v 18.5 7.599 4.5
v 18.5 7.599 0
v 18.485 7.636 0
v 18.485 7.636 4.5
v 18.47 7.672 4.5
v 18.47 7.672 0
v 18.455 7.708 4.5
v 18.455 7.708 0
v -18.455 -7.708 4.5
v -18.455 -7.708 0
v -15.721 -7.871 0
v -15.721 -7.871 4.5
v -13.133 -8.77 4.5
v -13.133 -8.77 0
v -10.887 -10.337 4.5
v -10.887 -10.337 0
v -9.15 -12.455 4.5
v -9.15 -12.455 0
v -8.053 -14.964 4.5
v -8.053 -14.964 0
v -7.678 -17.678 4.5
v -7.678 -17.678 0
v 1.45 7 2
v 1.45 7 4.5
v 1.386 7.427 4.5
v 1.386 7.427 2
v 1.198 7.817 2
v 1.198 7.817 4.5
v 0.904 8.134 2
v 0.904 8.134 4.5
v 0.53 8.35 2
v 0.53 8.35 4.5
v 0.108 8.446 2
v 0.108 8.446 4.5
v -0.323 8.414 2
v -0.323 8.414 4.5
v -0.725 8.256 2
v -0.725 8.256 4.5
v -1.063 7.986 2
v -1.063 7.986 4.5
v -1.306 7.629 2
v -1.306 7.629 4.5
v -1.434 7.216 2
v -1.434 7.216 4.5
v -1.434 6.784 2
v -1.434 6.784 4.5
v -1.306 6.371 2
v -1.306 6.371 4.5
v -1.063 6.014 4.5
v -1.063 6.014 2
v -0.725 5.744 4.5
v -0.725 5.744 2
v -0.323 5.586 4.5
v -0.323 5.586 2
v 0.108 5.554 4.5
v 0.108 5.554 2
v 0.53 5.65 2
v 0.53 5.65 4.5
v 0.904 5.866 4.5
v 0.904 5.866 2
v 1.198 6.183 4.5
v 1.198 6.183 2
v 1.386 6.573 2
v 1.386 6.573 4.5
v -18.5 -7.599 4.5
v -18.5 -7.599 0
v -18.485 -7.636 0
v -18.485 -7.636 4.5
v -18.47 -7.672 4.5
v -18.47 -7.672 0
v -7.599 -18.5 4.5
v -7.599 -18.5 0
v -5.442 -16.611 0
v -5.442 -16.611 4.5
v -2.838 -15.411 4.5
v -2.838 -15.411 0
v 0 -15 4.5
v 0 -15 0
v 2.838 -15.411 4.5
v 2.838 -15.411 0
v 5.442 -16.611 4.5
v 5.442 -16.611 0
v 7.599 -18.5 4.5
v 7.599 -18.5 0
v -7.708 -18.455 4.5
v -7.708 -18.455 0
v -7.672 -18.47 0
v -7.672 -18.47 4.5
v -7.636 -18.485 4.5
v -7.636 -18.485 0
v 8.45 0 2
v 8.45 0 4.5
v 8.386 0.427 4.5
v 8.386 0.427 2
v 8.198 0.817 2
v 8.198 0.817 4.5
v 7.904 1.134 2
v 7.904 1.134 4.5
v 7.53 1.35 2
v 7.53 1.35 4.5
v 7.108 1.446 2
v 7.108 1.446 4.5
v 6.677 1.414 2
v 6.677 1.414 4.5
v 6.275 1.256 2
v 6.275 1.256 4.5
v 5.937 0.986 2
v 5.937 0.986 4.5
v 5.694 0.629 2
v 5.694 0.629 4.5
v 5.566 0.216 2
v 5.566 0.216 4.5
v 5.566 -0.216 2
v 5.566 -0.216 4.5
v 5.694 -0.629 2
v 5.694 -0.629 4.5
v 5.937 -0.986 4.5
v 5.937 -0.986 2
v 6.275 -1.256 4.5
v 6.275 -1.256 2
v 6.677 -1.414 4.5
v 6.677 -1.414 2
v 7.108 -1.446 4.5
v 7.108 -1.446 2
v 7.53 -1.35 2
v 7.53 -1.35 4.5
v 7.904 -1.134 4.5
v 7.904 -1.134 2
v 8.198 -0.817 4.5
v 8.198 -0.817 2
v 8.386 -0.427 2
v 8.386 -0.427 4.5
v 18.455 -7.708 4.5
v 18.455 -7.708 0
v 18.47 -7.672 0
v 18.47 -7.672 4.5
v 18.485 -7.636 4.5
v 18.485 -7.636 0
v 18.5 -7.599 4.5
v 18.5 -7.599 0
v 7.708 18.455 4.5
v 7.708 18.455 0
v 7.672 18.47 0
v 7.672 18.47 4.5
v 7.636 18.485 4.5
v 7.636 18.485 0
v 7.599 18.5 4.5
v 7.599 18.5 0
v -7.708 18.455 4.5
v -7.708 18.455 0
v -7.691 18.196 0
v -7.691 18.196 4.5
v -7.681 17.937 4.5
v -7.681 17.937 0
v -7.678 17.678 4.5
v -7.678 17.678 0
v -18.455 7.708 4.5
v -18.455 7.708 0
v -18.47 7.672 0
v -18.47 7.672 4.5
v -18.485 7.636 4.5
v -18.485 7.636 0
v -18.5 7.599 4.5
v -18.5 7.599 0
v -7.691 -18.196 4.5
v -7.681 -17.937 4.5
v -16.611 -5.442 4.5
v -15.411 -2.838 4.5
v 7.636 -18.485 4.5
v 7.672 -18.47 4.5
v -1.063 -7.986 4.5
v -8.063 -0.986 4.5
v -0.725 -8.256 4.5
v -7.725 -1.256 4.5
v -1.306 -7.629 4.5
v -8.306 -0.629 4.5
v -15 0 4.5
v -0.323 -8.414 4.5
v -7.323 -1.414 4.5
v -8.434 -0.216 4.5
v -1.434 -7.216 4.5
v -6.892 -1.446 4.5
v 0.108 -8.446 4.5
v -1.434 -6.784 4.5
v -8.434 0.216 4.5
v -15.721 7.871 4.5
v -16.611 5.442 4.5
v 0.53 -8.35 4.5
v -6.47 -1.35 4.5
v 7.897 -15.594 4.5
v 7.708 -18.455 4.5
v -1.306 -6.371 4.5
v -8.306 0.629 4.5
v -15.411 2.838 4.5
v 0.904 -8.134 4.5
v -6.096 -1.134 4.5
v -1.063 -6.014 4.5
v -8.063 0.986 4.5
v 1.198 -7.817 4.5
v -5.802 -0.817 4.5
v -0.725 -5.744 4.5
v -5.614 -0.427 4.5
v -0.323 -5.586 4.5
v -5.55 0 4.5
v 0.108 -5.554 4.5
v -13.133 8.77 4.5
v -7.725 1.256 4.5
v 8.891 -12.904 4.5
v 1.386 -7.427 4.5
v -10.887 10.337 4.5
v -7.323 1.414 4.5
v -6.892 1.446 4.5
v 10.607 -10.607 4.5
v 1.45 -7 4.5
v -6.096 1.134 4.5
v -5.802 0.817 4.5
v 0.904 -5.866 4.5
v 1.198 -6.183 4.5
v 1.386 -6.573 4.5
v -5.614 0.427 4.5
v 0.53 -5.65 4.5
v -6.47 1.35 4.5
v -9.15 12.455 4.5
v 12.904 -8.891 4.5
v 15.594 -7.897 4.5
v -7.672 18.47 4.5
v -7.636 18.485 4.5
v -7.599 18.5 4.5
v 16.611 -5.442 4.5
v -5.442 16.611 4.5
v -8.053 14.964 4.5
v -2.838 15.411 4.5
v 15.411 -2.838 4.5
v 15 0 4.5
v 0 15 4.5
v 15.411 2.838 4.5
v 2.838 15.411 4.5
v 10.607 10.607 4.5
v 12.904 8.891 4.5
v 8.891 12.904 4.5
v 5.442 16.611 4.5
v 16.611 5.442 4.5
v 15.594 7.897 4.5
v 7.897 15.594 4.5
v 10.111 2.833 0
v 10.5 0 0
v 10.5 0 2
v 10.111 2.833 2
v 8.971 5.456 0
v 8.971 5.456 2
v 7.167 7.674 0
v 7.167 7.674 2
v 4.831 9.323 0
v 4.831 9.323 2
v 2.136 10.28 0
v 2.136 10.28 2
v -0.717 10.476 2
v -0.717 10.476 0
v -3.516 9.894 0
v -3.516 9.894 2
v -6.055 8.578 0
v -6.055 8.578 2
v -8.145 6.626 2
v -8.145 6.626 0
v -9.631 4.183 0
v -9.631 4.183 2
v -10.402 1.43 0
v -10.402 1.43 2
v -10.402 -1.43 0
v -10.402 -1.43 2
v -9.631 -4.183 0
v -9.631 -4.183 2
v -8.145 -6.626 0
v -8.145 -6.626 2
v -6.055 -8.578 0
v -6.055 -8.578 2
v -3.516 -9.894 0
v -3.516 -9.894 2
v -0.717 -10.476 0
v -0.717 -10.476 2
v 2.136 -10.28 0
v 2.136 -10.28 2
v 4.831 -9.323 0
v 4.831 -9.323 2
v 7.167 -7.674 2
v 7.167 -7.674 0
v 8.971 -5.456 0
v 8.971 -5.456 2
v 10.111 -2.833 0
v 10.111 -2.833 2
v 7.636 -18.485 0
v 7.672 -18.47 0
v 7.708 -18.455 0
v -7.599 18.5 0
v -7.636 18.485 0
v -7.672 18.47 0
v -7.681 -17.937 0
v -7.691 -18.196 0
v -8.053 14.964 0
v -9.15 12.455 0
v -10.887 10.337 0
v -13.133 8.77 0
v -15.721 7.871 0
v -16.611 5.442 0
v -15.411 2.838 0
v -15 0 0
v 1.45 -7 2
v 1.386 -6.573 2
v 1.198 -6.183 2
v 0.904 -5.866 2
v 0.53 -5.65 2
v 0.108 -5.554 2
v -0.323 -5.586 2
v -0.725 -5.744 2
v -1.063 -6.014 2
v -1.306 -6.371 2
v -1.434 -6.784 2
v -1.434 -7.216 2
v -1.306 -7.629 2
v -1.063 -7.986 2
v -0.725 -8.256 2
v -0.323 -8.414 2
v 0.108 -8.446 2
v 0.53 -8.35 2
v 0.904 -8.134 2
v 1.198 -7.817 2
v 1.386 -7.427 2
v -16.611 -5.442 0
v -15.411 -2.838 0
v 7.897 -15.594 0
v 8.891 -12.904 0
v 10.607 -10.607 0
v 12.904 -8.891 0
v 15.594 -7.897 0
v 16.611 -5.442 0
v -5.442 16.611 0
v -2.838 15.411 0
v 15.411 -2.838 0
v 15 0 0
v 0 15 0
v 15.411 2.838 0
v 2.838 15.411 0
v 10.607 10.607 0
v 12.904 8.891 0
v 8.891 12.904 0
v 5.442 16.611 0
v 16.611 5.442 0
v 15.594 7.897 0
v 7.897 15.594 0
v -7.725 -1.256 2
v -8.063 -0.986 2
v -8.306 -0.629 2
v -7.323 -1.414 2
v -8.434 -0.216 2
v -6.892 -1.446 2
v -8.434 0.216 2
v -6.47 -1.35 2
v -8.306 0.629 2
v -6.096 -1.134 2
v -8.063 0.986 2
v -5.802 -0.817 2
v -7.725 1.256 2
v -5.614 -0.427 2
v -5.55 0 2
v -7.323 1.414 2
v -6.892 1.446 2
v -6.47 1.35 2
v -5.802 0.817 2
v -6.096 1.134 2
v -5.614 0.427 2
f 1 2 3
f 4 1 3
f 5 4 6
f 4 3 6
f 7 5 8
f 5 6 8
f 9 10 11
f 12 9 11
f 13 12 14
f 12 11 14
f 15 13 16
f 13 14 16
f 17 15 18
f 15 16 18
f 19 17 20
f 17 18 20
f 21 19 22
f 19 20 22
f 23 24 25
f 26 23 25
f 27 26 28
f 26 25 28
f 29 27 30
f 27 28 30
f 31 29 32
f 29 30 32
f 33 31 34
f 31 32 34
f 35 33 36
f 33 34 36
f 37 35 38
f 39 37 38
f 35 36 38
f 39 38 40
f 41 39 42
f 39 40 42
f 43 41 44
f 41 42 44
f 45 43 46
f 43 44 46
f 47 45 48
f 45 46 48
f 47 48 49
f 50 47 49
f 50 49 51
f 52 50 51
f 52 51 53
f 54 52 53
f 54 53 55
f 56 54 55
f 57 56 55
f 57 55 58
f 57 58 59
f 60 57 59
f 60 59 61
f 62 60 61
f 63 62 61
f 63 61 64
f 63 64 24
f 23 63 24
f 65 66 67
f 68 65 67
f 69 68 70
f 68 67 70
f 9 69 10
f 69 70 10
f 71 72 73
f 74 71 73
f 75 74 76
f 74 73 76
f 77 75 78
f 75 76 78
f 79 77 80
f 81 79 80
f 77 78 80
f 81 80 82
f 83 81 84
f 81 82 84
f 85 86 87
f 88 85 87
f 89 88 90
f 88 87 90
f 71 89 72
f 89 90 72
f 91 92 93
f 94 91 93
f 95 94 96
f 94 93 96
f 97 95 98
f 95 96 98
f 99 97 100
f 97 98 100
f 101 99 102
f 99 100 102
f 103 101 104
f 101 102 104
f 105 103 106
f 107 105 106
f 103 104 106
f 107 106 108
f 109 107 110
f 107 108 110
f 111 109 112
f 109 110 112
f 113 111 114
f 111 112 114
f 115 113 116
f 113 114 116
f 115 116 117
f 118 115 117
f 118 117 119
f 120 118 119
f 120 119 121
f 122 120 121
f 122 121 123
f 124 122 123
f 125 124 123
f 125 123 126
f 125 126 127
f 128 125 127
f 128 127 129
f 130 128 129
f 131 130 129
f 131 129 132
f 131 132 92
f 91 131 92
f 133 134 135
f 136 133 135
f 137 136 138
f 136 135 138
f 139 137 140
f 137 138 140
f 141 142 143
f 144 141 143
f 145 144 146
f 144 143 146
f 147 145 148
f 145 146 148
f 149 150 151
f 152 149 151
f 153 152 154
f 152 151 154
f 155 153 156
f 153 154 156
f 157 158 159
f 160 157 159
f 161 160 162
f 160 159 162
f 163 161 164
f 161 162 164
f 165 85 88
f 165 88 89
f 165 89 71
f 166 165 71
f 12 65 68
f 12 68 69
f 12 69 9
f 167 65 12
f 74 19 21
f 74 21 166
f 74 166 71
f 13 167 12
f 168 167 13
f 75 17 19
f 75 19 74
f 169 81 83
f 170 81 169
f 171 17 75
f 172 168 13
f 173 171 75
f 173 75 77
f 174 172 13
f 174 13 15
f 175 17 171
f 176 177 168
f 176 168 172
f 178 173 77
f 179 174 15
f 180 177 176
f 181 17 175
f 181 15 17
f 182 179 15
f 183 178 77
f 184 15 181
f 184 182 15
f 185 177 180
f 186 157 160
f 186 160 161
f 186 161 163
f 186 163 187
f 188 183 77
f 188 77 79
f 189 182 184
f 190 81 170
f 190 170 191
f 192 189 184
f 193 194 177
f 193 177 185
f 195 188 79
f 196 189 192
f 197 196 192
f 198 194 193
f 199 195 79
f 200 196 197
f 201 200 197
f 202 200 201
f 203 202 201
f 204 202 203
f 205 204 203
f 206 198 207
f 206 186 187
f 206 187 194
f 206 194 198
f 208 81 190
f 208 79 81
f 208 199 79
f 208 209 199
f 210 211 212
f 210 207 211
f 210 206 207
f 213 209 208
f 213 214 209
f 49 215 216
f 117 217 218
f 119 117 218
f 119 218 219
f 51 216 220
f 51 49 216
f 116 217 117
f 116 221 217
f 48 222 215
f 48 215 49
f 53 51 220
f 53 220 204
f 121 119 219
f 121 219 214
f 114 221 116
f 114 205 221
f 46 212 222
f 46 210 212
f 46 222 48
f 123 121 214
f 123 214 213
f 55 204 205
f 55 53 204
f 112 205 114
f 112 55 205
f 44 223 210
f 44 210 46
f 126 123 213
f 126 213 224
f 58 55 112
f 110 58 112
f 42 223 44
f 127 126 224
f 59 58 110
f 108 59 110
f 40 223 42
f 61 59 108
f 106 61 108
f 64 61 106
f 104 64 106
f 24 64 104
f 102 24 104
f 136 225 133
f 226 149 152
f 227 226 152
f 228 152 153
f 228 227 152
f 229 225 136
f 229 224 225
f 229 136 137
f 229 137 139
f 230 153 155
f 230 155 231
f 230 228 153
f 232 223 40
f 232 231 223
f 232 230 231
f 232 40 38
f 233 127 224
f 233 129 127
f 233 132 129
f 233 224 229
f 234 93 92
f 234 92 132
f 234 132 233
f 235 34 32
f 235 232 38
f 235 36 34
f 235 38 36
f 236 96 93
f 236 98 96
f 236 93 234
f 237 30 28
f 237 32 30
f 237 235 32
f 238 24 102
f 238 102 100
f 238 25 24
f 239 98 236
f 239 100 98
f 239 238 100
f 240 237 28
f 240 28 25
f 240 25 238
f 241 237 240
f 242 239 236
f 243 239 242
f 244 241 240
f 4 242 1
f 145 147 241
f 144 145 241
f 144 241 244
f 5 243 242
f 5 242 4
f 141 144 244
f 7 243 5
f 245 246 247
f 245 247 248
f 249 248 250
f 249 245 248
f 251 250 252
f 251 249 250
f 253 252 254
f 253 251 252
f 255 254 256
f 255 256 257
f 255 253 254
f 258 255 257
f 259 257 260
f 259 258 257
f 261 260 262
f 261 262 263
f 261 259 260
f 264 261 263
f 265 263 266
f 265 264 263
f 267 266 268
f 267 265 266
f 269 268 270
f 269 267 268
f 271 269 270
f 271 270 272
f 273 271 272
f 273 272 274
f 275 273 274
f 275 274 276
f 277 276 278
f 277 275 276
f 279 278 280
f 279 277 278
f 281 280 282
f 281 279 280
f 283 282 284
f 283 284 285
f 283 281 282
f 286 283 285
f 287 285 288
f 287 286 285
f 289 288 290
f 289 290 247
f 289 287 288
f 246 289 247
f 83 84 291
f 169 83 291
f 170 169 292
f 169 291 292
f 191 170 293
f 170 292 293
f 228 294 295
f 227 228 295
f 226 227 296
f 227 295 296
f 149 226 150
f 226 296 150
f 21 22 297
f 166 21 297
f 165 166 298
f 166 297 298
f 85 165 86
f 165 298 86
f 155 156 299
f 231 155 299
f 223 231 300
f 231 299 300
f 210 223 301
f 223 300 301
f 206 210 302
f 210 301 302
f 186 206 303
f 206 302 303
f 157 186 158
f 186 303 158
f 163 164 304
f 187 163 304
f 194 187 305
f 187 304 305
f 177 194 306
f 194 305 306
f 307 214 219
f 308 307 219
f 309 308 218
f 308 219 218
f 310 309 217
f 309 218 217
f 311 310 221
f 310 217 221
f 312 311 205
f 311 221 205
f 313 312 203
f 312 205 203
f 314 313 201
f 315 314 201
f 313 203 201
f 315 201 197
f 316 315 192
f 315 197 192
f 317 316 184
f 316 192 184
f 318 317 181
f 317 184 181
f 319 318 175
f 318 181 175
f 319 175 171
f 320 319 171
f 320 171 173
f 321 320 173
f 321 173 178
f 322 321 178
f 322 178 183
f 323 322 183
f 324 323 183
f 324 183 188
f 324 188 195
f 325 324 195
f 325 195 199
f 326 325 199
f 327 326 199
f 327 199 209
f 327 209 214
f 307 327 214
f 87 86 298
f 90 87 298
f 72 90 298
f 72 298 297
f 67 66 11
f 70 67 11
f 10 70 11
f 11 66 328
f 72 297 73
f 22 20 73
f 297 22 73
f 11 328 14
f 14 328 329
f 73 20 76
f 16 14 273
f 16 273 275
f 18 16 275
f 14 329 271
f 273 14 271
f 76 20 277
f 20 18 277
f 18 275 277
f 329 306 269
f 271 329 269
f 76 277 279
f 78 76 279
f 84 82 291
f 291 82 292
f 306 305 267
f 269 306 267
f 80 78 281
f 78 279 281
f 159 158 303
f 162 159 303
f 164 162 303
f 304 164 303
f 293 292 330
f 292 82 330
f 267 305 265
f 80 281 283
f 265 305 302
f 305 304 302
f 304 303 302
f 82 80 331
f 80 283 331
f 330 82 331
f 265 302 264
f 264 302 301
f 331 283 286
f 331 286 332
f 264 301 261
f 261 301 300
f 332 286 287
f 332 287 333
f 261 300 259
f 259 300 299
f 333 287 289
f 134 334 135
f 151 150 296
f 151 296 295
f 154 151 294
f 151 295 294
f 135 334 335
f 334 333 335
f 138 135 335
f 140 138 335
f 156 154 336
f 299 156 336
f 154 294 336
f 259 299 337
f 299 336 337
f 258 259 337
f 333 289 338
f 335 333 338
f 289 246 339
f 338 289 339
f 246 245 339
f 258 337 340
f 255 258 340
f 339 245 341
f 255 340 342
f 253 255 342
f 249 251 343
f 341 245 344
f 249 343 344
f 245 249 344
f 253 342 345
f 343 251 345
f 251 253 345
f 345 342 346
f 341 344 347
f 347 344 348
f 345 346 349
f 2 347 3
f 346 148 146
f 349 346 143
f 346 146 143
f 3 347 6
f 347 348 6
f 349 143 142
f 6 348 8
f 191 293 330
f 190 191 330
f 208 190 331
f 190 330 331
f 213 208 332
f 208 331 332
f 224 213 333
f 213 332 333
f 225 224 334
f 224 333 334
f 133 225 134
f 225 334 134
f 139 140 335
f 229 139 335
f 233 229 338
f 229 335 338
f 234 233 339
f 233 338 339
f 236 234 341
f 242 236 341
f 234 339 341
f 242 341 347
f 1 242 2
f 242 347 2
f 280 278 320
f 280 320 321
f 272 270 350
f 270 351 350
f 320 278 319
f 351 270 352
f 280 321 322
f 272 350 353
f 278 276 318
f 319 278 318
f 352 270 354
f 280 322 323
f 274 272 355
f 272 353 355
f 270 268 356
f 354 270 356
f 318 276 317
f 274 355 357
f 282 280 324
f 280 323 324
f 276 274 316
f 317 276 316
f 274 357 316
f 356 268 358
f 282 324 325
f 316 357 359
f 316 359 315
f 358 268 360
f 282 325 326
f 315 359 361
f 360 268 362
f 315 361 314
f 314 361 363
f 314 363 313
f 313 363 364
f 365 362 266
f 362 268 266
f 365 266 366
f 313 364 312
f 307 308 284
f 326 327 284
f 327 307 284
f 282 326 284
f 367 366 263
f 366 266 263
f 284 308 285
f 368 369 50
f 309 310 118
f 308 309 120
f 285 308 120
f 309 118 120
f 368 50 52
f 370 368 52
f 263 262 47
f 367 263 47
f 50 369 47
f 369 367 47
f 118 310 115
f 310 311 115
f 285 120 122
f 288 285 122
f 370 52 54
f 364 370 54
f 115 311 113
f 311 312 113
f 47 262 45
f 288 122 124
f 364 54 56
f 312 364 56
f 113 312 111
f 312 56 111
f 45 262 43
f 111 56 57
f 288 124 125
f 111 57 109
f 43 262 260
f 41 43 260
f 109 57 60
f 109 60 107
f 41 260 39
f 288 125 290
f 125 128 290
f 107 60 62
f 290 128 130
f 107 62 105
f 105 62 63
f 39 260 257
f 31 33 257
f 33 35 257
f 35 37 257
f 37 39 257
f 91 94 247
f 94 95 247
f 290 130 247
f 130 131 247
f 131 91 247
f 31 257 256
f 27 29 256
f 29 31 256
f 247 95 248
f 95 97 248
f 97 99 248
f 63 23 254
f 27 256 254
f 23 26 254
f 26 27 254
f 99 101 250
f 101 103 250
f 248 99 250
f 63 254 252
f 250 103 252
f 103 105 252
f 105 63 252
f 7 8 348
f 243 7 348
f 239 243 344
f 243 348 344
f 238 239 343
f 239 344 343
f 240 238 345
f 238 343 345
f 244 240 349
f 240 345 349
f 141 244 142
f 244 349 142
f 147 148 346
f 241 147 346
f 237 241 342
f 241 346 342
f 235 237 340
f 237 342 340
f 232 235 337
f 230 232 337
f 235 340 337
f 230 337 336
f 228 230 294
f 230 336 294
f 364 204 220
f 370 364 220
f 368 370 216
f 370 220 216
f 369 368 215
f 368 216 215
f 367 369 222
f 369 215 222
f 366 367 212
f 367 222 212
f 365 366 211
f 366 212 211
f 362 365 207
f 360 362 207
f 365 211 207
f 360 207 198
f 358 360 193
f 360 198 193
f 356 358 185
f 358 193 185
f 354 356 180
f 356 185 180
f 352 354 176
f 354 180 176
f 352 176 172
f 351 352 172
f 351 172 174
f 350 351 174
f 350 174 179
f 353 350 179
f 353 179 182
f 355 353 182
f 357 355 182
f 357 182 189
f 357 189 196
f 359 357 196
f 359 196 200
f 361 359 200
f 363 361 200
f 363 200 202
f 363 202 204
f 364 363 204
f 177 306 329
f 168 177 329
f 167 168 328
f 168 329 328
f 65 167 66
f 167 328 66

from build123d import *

# Parameters (mm, degrees)
BOSS_EXTRUDE1_DEPTH = 4.5
SKETCH3_R           = 10.5
CUT_EXTRUDE1_DEPTH  = 2
CUT_EXTRUDE2_REACH  = 6.5
SKETCH4_R           = 1.45


with BuildPart() as part:
    # Sketch2 → Boss-Extrude1 (new body)
    with BuildSketch(Plane.XY):
        with BuildLine():
            ThreePointArc((18.5, -7.599342077), (15, 0), (18.5, 7.599342077))
            ThreePointArc((18.5, 7.599342077), (18.47759065, 7.653668647), (18.455021767, 7.707929137))
            ThreePointArc((18.455021767, 7.707929137), (10.606601718, 10.606601718), (7.707929137, 18.455021767))
            ThreePointArc((7.707929137, 18.455021767), (7.653668647, 18.47759065), (7.599342077, 18.5))
            ThreePointArc((7.599342077, 18.5), (0, 15), (-7.599342077, 18.5))
            ThreePointArc((-7.599342077, 18.5), (-7.653668647, 18.47759065), (-7.707929137, 18.455021767))
            ThreePointArc((-7.707929137, 18.455021767), (-7.685237295, 18.066640012), (-7.67766953, 17.67766953))
            ThreePointArc((-7.67766953, 17.67766953), (-10.886996602, 10.33690927), (-18.455021767, 7.707929137))
            ThreePointArc((-18.455021767, 7.707929137), (-18.47759065, 7.653668647), (-18.5, 7.599342077))
            ThreePointArc((-18.5, 7.599342077), (-15.917048938, 4.183300133), (-15, 0))
            ThreePointArc((-15, 0), (-15.917048938, -4.183300133), (-18.5, -7.599342077))
            ThreePointArc((-18.5, -7.599342077), (-18.47759065, -7.653668647), (-18.455021767, -7.707929137))
            ThreePointArc((-18.455021767, -7.707929137), (-10.886996602, -10.33690927), (-7.67766953, -17.67766953))
            ThreePointArc((-7.67766953, -17.67766953), (-7.685237295, -18.066640012), (-7.707929137, -18.455021767))
            ThreePointArc((-7.707929137, -18.455021767), (-7.653668647, -18.47759065), (-7.599342077, -18.5))
            ThreePointArc((-7.599342077, -18.5), (0, -15), (7.599342077, -18.5))
            ThreePointArc((7.599342077, -18.5), (7.653668647, -18.47759065), (7.707929137, -18.455021767))
            ThreePointArc((7.707929137, -18.455021767), (10.606601718, -10.606601718), (18.455021767, -7.707929137))
            ThreePointArc((18.455021767, -7.707929137), (18.47759065, -7.653668647), (18.5, -7.599342077))
        make_face()
    extrude(amount=BOSS_EXTRUDE1_DEPTH)

    # Sketch3 → Cut-Extrude1 (cut)
    with BuildSketch(Plane.XY):
        Circle(SKETCH3_R)
    extrude(amount=CUT_EXTRUDE1_DEPTH, mode=Mode.SUBTRACT)

    # Sketch4 → Cut-Extrude2 (cut, up to next)
    with BuildSketch(Plane.XY.offset(4.5), mode=Mode.PRIVATE) as cut_extrude2_sk1:
        with Locations((0, 7)):
            Circle(SKETCH4_R)
    cut_extrude2_tool1 = extrude(cut_extrude2_sk1.sketch, amount=-CUT_EXTRUDE2_REACH, mode=Mode.PRIVATE) & part.part
    add(cut_extrude2_tool1.solids().sort_by_distance((0, 7, 4.5))[0], mode=Mode.SUBTRACT)
    # Sketch4 → Cut-Extrude2 (cut, up to next)
    with BuildSketch(Plane.XY.offset(4.5), mode=Mode.PRIVATE) as cut_extrude2_sk2:
        with Locations((7, 0)):
            Circle(SKETCH4_R)
    cut_extrude2_tool2 = extrude(cut_extrude2_sk2.sketch, amount=-CUT_EXTRUDE2_REACH, mode=Mode.PRIVATE) & part.part
    add(cut_extrude2_tool2.solids().sort_by_distance((7, 0, 4.5))[0], mode=Mode.SUBTRACT)
    # Sketch4 → Cut-Extrude2 (cut, up to next)
    with BuildSketch(Plane.XY.offset(4.5), mode=Mode.PRIVATE) as cut_extrude2_sk3:
        with Locations((0, -7)):
            Circle(SKETCH4_R)
    cut_extrude2_tool3 = extrude(cut_extrude2_sk3.sketch, amount=-CUT_EXTRUDE2_REACH, mode=Mode.PRIVATE) & part.part
    add(cut_extrude2_tool3.solids().sort_by_distance((0, -7, 4.5))[0], mode=Mode.SUBTRACT)
    # Sketch4 → Cut-Extrude2 (cut, up to next)
    with BuildSketch(Plane.XY.offset(4.5), mode=Mode.PRIVATE) as cut_extrude2_sk4:
        with Locations((-7, 0)):
            Circle(SKETCH4_R)
    cut_extrude2_tool4 = extrude(cut_extrude2_sk4.sketch, amount=-CUT_EXTRUDE2_REACH, mode=Mode.PRIVATE) & part.part
    add(cut_extrude2_tool4.solids().sort_by_distance((-7, 0, 4.5))[0], mode=Mode.SUBTRACT)


solid = part.part
